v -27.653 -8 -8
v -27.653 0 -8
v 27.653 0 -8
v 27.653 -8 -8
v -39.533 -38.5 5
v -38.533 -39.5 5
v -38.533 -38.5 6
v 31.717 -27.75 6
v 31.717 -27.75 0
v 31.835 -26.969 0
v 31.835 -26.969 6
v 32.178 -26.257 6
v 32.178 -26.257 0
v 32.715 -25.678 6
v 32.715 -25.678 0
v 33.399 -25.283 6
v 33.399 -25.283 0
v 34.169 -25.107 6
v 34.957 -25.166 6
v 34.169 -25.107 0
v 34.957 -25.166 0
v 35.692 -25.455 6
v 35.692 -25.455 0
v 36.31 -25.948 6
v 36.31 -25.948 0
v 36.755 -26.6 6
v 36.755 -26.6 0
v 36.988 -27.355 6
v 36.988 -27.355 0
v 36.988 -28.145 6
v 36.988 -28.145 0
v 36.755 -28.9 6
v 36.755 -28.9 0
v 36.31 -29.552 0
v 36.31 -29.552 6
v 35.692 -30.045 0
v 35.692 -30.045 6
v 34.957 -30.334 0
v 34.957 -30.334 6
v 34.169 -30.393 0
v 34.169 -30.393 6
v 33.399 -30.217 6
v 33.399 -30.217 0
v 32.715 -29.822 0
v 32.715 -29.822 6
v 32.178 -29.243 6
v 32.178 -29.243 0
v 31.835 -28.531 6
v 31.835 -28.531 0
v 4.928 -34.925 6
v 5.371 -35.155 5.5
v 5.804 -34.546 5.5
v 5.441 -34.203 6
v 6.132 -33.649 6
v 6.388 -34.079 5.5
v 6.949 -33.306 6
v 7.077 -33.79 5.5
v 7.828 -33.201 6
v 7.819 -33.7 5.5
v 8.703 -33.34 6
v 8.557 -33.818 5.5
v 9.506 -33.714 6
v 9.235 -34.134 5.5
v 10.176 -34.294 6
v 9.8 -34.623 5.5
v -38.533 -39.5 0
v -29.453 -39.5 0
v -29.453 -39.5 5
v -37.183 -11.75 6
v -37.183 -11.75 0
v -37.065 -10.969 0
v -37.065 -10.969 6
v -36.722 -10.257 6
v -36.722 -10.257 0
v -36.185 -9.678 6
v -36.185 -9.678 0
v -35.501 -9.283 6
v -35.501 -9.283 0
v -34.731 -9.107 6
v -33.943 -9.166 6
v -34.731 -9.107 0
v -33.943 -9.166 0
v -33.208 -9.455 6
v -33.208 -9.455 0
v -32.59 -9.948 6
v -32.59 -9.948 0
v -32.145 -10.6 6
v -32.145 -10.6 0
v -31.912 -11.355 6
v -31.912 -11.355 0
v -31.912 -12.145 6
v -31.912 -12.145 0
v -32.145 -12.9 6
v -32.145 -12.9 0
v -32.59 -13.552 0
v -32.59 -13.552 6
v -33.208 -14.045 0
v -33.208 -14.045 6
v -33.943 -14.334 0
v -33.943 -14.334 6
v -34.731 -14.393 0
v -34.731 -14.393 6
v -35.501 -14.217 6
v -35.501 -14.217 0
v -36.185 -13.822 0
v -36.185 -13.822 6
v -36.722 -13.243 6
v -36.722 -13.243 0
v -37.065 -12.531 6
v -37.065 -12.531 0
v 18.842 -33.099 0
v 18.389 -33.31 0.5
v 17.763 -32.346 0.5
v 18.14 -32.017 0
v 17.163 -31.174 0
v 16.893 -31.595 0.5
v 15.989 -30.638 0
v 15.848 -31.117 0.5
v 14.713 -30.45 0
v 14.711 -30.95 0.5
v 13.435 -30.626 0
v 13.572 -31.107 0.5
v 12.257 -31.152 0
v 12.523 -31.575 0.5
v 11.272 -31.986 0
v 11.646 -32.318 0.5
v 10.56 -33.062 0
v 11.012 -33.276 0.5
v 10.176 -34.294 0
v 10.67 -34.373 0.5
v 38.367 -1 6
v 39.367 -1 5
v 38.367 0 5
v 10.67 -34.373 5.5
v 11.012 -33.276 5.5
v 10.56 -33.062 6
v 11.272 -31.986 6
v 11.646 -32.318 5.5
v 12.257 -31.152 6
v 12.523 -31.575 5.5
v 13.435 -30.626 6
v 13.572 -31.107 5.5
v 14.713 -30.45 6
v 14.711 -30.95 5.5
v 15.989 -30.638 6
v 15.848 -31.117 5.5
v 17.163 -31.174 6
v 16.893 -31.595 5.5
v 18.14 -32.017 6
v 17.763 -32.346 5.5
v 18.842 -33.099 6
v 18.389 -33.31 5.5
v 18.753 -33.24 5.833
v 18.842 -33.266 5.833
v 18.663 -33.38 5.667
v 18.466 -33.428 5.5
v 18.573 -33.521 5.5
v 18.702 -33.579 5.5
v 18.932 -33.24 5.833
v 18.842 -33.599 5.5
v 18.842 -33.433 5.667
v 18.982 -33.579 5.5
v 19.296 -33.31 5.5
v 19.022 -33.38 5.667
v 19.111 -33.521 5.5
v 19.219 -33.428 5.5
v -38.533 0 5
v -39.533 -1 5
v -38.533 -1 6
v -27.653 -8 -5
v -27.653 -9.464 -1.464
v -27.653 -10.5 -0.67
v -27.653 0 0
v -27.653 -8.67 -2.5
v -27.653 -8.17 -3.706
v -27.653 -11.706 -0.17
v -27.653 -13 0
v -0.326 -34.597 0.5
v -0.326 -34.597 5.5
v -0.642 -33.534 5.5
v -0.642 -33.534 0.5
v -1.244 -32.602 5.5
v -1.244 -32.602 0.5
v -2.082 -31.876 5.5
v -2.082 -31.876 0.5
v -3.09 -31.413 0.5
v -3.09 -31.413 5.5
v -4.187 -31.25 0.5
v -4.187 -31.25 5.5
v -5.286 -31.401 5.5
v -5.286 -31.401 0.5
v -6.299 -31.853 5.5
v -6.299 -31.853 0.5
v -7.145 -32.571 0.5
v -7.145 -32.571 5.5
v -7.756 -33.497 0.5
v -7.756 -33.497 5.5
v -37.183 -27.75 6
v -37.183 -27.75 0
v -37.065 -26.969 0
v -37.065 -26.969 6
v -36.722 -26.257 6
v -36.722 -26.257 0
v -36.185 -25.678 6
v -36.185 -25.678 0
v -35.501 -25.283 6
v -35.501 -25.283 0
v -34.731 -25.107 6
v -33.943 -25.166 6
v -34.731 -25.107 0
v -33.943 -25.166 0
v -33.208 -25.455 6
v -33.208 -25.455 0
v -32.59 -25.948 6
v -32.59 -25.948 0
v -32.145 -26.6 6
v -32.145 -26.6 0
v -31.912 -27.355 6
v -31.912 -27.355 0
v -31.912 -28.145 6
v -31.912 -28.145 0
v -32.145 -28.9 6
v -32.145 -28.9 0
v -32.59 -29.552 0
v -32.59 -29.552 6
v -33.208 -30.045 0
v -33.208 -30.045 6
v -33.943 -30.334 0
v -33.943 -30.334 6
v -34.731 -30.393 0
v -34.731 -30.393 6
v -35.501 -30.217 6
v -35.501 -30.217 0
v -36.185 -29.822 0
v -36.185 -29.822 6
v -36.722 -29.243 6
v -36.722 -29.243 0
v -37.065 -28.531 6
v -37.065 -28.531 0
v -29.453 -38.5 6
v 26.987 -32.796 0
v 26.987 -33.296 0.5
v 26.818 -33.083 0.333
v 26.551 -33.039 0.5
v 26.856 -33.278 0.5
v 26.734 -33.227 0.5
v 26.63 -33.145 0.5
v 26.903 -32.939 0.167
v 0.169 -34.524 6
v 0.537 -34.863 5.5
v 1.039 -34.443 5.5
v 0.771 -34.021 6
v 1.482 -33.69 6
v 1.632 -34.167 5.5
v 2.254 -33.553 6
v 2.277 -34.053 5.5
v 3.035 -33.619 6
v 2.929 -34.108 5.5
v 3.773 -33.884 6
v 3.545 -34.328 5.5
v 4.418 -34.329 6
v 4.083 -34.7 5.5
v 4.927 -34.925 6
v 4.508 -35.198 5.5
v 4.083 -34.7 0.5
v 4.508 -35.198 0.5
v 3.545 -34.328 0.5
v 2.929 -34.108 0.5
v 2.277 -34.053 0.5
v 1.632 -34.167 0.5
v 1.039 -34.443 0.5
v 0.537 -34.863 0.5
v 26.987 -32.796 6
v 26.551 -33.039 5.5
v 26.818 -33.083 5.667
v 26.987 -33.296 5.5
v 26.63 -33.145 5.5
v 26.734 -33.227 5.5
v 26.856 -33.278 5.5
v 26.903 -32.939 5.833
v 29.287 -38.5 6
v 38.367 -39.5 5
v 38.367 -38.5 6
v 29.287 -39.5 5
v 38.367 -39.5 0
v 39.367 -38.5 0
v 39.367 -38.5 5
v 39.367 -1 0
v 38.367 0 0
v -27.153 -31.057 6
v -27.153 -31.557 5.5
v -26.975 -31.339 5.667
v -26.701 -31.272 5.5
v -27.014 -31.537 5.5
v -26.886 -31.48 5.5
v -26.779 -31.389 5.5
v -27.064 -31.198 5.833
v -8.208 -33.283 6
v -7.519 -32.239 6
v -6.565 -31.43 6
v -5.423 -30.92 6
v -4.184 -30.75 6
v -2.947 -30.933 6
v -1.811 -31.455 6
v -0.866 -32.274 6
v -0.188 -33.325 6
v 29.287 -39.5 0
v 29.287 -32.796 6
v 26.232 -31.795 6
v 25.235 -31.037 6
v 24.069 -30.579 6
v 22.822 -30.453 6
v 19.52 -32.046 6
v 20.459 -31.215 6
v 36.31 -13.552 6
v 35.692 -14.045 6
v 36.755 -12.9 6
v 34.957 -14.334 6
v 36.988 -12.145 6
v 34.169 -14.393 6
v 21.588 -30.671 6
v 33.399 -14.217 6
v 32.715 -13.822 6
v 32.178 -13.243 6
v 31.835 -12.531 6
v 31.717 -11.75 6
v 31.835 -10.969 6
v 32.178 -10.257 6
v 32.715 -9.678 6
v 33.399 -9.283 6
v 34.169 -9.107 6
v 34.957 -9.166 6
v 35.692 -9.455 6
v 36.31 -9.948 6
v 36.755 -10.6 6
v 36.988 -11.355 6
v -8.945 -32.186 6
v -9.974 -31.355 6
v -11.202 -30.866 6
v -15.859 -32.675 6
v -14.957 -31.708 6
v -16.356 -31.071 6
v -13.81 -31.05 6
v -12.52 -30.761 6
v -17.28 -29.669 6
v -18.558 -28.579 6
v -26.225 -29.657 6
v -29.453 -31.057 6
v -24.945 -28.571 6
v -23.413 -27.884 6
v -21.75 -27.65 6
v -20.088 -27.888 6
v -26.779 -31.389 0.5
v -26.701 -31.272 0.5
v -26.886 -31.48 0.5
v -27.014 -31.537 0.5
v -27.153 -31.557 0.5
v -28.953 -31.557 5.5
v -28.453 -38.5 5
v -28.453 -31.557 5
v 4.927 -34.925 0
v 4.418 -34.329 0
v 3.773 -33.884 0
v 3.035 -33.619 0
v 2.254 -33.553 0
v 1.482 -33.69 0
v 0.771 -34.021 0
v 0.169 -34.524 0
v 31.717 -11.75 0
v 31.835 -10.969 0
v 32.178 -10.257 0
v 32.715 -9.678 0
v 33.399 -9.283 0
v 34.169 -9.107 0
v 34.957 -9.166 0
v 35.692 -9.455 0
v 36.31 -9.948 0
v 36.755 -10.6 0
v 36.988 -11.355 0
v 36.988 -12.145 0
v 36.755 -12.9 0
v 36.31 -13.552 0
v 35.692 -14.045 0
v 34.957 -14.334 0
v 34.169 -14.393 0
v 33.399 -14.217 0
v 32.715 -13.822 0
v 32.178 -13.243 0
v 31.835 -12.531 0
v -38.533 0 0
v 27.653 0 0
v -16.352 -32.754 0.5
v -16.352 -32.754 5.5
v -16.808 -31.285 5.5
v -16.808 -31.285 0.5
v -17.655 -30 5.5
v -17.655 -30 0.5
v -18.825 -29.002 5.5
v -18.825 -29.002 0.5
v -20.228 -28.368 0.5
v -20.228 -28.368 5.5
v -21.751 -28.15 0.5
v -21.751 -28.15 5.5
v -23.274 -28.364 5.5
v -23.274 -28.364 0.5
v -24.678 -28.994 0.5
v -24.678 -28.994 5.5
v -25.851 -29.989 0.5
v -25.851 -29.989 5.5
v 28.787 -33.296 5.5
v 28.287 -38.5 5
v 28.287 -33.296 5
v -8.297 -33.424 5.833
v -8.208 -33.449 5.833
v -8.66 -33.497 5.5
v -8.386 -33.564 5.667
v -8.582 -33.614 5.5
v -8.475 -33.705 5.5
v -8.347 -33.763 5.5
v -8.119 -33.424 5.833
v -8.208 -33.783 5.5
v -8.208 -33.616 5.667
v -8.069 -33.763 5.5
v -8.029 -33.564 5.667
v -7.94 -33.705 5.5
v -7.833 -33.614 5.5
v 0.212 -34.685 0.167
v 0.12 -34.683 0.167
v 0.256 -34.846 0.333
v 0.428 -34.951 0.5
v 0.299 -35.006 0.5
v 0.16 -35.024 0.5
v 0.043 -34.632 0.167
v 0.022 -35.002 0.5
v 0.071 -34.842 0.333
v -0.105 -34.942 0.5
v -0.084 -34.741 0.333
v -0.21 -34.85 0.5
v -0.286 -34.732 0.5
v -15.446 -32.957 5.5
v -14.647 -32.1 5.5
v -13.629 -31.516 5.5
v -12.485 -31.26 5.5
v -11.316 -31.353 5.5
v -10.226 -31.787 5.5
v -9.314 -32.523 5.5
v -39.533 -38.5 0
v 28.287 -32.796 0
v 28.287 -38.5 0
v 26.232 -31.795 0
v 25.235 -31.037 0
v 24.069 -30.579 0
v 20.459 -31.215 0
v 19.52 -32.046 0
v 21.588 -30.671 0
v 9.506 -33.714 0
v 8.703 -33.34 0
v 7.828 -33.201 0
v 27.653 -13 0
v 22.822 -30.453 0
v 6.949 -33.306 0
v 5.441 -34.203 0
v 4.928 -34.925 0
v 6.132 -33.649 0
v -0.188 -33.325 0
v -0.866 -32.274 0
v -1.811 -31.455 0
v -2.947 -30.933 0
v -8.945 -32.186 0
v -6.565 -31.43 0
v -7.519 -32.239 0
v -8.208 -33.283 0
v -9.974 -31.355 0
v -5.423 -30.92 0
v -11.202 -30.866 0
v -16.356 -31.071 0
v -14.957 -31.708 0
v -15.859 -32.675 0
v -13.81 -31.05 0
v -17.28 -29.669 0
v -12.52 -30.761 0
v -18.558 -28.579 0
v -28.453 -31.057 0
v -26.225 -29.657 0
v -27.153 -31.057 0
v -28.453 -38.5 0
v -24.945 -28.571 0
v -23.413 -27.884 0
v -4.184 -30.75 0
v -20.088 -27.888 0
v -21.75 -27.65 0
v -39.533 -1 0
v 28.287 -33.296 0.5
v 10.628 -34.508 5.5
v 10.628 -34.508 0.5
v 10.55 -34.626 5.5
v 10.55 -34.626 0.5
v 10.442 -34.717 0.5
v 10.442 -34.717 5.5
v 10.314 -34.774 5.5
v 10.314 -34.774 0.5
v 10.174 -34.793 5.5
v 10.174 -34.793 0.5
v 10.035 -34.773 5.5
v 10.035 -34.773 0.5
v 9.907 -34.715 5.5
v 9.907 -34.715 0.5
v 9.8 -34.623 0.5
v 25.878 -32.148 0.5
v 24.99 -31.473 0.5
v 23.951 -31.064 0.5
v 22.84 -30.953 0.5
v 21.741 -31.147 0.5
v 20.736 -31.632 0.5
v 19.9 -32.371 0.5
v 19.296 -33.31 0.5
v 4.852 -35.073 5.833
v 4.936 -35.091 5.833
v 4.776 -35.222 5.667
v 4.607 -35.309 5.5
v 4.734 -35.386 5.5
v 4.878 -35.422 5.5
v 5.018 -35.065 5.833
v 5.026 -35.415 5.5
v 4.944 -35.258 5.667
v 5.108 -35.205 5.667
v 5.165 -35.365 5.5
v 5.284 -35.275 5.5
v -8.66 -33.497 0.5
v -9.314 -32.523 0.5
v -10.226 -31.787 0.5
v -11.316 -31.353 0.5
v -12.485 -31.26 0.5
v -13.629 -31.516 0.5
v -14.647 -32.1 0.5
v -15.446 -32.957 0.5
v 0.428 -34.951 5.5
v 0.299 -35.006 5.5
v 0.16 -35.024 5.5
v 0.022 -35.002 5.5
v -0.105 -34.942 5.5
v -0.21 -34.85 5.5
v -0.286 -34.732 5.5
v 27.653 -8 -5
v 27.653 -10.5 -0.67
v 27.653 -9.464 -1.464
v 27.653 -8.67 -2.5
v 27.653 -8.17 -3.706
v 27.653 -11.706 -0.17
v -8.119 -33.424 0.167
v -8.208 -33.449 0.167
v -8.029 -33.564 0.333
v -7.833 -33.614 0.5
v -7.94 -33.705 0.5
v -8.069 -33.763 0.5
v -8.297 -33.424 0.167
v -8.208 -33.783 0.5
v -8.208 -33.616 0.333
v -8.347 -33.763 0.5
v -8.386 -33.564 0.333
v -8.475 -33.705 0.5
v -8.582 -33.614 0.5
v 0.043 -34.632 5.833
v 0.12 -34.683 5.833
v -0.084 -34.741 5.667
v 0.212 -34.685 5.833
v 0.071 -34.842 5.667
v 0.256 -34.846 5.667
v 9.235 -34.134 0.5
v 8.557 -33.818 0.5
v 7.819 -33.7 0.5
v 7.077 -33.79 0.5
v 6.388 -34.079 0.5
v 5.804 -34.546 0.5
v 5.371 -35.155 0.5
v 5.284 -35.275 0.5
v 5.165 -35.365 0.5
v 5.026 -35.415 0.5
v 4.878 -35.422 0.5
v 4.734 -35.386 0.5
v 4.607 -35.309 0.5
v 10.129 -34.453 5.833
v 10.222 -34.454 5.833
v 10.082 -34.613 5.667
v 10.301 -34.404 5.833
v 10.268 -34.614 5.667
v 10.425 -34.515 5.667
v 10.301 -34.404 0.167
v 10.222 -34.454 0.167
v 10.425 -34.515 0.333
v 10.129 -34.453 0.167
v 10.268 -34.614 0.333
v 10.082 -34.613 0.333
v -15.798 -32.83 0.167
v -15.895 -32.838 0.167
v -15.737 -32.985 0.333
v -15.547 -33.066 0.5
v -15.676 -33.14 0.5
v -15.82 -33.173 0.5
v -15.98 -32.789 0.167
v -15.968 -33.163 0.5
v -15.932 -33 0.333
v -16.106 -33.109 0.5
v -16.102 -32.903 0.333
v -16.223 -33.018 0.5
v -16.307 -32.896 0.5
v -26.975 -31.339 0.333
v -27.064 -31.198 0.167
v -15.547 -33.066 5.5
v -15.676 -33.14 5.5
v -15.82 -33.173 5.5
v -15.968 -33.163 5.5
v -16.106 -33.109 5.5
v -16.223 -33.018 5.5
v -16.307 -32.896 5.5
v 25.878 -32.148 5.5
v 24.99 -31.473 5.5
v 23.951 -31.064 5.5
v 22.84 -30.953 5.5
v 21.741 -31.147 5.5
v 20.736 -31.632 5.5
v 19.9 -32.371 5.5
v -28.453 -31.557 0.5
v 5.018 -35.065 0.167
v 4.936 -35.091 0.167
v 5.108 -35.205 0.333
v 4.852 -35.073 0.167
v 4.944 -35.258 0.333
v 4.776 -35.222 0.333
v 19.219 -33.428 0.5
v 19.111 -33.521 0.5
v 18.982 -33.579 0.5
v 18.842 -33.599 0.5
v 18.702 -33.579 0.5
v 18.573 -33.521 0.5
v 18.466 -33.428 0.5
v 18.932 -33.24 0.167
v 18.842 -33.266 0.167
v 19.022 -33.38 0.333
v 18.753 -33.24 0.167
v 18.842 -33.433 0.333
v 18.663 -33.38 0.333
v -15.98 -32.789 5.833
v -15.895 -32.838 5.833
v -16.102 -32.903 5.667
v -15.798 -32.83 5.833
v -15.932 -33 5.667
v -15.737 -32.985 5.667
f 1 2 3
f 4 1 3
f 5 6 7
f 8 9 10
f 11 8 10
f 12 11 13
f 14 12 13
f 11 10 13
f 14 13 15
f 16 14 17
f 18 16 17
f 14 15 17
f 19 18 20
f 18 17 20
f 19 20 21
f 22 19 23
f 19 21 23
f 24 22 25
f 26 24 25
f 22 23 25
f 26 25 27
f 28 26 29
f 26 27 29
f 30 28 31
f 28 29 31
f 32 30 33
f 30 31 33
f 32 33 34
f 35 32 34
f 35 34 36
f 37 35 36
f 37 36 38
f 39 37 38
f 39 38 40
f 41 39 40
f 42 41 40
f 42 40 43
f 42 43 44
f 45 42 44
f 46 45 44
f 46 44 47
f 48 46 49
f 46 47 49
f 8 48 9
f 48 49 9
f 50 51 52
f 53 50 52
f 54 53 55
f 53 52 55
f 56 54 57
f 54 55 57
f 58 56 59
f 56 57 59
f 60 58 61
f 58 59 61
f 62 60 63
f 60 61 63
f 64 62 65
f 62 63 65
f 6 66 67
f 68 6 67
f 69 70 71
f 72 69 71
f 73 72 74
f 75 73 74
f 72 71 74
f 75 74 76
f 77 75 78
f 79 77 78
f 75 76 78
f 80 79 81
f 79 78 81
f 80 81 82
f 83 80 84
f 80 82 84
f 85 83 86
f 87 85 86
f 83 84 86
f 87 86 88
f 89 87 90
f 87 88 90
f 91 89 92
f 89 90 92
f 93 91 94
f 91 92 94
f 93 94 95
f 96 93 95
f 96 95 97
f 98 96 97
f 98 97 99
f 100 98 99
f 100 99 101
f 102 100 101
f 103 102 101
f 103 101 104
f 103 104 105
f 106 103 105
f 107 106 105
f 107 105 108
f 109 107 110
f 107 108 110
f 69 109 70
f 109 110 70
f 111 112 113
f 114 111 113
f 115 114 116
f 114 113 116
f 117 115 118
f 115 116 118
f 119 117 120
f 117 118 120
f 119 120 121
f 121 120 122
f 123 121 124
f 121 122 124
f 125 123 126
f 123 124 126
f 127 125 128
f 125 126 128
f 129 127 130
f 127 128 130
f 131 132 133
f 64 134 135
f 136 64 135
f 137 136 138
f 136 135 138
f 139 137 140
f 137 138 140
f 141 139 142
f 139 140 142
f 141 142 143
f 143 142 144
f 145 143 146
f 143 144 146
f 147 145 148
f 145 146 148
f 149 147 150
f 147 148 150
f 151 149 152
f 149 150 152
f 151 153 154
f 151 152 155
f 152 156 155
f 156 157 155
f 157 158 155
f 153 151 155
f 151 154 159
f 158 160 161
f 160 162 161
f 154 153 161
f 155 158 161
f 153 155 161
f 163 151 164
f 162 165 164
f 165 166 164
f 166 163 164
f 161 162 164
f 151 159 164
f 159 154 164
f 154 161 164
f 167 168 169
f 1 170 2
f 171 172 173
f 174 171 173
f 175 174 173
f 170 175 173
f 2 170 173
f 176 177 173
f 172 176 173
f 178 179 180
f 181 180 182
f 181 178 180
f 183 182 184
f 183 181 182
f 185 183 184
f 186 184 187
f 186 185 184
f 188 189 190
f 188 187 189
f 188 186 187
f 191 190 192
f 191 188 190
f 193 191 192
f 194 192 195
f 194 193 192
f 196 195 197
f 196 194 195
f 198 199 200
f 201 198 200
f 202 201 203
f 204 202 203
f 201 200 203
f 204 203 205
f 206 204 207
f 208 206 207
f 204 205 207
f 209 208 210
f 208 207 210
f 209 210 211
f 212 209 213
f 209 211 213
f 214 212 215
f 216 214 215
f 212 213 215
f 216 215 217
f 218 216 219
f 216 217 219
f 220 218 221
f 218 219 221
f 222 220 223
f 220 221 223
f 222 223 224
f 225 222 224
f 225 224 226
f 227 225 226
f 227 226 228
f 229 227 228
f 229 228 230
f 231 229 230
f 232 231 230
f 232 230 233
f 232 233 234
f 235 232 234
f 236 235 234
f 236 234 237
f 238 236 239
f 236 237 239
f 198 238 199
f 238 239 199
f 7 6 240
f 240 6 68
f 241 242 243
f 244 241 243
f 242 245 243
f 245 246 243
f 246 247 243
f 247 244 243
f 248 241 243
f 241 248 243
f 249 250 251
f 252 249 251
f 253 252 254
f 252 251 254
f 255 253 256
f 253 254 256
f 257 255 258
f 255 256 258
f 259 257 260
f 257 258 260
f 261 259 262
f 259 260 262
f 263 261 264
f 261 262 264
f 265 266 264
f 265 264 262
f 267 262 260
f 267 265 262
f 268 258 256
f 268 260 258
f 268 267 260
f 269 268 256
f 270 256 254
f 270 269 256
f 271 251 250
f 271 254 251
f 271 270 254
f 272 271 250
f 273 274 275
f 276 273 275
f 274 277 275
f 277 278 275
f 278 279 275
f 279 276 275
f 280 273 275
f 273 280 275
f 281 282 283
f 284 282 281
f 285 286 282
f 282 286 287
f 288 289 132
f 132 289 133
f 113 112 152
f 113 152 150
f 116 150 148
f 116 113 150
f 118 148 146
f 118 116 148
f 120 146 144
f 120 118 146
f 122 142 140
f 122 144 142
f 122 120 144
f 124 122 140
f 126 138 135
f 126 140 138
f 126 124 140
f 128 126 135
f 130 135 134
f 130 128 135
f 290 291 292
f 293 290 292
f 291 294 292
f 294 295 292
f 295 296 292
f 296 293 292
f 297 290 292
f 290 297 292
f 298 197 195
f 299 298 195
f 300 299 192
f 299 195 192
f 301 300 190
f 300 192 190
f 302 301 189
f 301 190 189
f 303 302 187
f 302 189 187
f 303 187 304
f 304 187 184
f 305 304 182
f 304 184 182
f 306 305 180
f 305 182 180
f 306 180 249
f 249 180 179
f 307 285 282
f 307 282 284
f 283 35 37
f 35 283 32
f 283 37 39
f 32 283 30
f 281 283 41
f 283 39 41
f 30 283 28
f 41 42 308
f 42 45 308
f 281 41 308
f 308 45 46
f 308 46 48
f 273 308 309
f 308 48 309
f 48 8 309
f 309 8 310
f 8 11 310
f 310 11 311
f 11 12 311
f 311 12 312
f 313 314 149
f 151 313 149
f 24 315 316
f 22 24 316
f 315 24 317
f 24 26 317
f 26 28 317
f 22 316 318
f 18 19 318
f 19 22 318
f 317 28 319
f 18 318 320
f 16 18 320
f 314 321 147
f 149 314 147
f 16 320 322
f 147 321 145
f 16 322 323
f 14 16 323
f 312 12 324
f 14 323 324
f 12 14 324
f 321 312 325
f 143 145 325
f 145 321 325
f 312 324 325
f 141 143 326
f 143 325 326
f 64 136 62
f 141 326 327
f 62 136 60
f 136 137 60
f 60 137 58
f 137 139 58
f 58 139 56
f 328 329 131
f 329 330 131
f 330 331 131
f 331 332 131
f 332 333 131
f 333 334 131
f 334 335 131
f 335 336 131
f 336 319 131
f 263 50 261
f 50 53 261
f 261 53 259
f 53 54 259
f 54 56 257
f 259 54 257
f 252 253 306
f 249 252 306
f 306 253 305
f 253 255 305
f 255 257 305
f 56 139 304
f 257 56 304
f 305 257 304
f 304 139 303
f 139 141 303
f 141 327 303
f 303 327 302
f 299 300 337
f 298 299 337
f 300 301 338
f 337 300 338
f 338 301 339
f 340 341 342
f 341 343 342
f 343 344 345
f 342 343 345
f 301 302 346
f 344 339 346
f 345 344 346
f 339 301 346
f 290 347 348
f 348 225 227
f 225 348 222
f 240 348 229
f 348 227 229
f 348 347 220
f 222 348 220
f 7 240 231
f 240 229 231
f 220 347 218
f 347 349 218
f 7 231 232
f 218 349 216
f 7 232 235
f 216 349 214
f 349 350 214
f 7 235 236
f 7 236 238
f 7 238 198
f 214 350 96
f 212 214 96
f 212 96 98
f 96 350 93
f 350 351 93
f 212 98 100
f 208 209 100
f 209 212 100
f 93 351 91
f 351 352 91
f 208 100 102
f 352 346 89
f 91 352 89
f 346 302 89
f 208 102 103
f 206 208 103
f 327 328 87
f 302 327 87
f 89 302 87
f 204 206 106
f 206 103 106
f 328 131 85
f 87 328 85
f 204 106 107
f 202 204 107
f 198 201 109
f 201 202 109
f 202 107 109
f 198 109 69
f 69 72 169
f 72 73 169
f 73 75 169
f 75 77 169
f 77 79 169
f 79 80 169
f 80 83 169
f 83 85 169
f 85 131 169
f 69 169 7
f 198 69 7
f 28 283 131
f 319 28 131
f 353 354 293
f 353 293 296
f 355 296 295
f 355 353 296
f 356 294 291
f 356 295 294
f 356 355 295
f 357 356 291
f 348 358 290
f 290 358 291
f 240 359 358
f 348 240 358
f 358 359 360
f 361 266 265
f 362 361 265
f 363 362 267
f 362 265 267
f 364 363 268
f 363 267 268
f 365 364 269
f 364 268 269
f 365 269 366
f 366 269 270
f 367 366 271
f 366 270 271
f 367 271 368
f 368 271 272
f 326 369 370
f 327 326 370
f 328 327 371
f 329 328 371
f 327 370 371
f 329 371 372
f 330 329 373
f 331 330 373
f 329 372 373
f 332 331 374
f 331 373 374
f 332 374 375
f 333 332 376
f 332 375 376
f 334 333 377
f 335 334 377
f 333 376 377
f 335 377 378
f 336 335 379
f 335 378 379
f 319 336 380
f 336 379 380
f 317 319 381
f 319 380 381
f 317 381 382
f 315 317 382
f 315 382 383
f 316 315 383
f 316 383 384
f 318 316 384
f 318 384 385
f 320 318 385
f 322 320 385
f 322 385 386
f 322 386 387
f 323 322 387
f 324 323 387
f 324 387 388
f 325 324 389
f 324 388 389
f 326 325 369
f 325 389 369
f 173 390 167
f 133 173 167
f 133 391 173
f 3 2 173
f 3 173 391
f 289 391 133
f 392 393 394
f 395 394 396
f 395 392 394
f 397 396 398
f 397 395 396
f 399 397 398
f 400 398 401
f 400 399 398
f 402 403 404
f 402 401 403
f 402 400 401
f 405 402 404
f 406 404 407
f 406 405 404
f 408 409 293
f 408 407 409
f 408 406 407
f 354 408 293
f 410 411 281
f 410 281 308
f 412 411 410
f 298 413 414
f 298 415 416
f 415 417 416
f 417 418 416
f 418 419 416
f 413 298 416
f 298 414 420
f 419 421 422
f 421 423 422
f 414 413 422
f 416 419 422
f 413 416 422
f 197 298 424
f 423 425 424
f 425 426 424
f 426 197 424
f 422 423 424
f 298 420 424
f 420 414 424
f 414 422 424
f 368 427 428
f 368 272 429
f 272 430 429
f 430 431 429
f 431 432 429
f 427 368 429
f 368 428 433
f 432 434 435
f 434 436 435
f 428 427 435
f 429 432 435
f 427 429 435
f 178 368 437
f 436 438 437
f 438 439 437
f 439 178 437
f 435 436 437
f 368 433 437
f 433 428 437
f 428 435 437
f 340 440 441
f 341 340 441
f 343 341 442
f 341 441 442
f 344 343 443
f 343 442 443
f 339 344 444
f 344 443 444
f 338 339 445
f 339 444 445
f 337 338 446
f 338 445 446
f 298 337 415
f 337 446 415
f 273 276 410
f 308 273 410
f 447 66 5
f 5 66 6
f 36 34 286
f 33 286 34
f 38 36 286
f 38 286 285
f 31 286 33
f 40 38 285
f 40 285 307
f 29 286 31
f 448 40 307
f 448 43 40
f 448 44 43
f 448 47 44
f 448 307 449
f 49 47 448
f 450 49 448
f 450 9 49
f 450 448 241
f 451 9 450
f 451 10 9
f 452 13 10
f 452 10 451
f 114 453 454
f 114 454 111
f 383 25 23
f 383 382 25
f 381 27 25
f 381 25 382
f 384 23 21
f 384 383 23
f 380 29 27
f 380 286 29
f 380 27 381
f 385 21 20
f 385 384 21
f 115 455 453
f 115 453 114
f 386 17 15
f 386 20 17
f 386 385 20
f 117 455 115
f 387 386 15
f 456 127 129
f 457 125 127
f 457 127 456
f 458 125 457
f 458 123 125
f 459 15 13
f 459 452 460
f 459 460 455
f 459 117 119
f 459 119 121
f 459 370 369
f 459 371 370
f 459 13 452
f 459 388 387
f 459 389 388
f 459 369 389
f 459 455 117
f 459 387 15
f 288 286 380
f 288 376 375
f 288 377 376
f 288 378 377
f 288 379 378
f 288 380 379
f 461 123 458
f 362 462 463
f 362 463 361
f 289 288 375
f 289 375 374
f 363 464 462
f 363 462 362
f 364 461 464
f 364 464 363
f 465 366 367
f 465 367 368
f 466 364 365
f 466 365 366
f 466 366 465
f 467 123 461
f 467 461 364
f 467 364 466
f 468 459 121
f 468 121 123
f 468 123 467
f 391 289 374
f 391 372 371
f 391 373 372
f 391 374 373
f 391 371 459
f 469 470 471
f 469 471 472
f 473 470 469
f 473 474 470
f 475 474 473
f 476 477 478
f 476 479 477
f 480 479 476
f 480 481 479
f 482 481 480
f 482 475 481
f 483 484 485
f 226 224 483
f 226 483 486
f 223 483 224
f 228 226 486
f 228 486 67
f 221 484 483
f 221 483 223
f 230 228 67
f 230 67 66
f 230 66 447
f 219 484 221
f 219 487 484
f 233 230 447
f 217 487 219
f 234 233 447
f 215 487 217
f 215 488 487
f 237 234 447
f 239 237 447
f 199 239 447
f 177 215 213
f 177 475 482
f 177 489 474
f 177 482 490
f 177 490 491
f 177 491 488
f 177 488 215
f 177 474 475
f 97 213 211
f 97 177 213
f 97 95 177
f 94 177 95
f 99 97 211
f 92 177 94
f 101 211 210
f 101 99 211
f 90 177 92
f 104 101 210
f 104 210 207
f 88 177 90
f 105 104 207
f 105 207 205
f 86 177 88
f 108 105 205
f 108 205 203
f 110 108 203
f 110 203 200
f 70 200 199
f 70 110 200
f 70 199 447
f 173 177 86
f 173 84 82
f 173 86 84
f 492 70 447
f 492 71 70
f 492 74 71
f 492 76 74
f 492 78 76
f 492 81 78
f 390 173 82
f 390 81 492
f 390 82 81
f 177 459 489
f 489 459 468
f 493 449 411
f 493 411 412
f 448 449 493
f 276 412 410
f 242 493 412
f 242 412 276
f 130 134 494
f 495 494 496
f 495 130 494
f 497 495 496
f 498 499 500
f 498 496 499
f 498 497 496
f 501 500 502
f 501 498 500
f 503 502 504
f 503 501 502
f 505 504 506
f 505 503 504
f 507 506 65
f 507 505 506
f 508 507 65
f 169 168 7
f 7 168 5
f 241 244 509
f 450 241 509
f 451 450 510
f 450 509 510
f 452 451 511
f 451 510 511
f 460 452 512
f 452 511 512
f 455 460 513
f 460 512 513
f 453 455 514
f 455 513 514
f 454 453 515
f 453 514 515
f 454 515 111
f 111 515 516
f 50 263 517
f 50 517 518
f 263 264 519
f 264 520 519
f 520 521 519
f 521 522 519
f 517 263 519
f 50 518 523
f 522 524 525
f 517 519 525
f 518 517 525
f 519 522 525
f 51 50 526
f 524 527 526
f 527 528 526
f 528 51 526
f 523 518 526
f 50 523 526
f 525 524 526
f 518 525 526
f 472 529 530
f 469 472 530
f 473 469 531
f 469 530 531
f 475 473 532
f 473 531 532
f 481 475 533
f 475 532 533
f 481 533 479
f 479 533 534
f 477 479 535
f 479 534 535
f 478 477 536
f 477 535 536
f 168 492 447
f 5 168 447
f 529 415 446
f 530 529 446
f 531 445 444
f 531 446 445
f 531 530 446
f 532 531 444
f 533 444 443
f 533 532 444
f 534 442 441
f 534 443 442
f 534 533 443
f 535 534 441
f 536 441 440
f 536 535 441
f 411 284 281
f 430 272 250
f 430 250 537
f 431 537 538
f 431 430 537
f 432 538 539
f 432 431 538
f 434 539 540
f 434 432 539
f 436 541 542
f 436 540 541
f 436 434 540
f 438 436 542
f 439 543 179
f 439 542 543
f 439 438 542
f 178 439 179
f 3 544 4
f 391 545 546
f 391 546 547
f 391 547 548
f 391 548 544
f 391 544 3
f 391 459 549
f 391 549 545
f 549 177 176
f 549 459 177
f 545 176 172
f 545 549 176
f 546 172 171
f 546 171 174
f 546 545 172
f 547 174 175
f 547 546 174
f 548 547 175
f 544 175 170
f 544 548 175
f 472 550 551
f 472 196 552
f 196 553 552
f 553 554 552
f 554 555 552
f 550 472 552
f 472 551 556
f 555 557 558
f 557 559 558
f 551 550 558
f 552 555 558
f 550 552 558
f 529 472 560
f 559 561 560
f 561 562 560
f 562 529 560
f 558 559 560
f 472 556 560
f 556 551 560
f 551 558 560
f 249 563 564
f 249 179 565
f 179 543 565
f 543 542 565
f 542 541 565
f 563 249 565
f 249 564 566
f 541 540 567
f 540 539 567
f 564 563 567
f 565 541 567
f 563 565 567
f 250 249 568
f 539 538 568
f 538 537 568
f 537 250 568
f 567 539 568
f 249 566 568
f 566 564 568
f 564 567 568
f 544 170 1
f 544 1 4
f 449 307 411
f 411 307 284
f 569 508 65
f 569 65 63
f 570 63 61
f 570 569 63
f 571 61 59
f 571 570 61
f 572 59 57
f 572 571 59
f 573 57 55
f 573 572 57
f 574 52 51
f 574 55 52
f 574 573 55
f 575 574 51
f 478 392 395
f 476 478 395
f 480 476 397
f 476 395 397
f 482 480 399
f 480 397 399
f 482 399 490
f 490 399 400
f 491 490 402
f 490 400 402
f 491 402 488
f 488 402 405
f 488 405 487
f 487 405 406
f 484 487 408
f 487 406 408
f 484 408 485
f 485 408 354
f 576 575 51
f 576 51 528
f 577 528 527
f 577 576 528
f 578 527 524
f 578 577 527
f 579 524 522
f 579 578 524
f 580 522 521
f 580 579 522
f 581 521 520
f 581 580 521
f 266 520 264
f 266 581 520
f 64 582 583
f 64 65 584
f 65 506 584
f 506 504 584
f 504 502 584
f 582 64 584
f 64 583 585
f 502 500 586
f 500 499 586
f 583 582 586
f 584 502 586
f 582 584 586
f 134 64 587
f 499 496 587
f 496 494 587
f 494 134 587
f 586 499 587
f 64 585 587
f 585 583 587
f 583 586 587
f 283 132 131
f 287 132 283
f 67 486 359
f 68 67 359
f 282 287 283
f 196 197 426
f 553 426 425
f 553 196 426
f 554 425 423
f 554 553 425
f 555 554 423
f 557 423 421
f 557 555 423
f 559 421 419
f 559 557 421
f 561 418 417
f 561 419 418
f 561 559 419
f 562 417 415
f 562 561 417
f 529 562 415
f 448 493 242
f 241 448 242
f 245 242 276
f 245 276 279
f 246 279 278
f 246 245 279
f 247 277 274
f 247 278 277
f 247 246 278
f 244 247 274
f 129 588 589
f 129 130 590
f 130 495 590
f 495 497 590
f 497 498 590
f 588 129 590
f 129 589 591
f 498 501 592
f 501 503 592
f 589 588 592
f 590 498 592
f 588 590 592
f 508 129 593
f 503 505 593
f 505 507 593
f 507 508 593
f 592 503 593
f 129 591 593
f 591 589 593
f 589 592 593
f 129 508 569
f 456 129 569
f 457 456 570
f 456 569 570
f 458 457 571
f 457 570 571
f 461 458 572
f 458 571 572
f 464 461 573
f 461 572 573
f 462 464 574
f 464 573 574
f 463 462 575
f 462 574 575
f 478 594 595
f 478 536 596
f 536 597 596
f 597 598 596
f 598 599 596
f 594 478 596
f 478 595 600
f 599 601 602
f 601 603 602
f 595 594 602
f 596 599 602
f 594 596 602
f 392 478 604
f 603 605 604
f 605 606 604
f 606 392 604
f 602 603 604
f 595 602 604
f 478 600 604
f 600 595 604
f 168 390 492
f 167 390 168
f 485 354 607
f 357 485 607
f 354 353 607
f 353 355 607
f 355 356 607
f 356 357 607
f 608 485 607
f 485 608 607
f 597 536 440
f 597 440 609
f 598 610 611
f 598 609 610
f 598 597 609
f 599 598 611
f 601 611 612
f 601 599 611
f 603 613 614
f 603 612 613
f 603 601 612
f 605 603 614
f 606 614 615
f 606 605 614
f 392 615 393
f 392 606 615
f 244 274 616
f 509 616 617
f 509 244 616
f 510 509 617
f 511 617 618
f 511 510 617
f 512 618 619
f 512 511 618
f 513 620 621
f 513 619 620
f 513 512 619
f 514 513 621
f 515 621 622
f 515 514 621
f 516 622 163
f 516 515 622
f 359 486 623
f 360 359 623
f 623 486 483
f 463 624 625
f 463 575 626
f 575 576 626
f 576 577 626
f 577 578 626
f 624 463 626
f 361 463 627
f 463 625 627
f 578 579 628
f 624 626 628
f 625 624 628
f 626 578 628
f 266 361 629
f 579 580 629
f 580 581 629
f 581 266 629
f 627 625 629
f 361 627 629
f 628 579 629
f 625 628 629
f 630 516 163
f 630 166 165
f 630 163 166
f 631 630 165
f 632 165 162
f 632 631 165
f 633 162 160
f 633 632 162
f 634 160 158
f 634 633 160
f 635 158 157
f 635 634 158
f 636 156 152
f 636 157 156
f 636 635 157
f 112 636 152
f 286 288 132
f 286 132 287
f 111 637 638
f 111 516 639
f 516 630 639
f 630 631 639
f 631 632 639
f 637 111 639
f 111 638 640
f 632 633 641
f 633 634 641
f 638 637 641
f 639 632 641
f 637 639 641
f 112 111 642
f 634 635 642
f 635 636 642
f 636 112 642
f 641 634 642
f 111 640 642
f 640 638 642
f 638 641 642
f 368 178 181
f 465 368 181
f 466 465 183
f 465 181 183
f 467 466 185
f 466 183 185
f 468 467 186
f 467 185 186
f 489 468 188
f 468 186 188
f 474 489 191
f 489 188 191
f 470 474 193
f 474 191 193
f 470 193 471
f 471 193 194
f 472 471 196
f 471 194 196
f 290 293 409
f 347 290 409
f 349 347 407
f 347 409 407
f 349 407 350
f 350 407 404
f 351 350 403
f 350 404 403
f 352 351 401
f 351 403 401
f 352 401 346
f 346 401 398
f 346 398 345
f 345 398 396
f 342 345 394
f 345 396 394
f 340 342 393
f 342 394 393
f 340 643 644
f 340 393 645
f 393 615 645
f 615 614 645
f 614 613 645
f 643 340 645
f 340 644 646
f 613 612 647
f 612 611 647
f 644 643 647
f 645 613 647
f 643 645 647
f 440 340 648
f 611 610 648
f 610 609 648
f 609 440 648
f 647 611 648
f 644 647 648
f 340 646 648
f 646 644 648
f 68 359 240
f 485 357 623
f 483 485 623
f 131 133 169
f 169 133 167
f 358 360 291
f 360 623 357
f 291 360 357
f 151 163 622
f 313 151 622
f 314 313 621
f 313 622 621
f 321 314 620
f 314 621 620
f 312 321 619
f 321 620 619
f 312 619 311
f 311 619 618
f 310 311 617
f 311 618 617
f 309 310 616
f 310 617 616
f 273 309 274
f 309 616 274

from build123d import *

# Parameters (mm, degrees)
SKETCH3_W           = 78.9
SKETCH3_H           = 32
BOSS_EXTRUDE1_DEPTH = 10
SKETCH3_4_R         = 2.375
CUT_EXTRUDE1_DEPTH  = 8
SKETCH4_W           = 55.14
SKETCH4_H           = 39
BOSS_EXTRUDE2_DEPTH = 6
CUT_EXTRUDE2_REACH  = 66.041
SKETCH9_W           = 78.9
SKETCH9_H           = 10
CUT_EXTRUDE4_DEPTH  = 62.929181295
BOSS_EXTRUDE4_START = -6
SKETCH10_R          = 2.65
BOSS_EXTRUDE4_DEPTH = 6
SKETCH11_W          = 55.305509596
SKETCH11_H          = 8
BOSS_EXTRUDE5_DEPTH = 8
FILLET2_R           = 5
CHAMFER3_SIZE       = 1
CHAMFER4_SIZE       = 0.5


with BuildPart() as part:
    # Sketch3 → Boss-Extrude1 (new body)
    with BuildSketch(Plane(origin=(0, 0, 0), x_dir=(1, 0, 0), z_dir=(0, 1, 0))):
        with Locations((0, 16)):
            Rectangle(SKETCH3_W, SKETCH3_H)
    extrude(amount=BOSS_EXTRUDE1_DEPTH)

    # Sketch3<4> → Cut-Extrude1 (cut)
    with BuildSketch(Plane(origin=(0, 0, 0), x_dir=(1, 0, 0), z_dir=(0, 1, 0))):
        with Locations(Location((-34.45, 9.5, 0), (0, 0, 270))):
            Circle(SKETCH3_4_R)
        with Locations(Location((34.45, 9.5, 0), (0, 0, 270))):
            Circle(SKETCH3_4_R)
        with Locations(Location((-34.45, 25.5, 0), (0, 0, 270))):
            Circle(SKETCH3_4_R)
        with Locations(Location((34.45, 25.5, 0), (0, 0, 270))):
            Circle(SKETCH3_4_R)
    extrude(amount=CUT_EXTRUDE1_DEPTH, mode=Mode.SUBTRACT)

    # Sketch4 → Boss-Extrude2 (add)
    with BuildSketch(Plane.XY):
        with Locations((-0.082754798, -19.5)):
            Rectangle(SKETCH4_W, SKETCH4_H)
    extrude(amount=-BOSS_EXTRUDE2_DEPTH)

    # Sketch6 → Cut-Extrude2 (cut, up to next)
    with BuildSketch(Plane.XY, mode=Mode.PRIVATE) as cut_extrude2_sk1:
        with BuildLine():
            Line((-27.652754798, -39), (27.487245202, -39))
            Line((27.487245202, -39), (27.487245202, -32.795515755))
            ThreePointArc((27.487245202, -32.795515755), (27.113130048, -33.279409344), (26.55063318, -33.039175235))
            ThreePointArc((26.55063318, -33.039175235), (22.840340095, -30.952832292), (19.295797115, -33.309804228))
            ThreePointArc((19.295797115, -33.309804228), (18.842245202, -33.599350759), (18.388693289, -33.309804228))
            ThreePointArc((18.388693289, -33.309804228), (14.135992665, -30.988143783), (10.669672877, -34.373435048))
            ThreePointArc((10.669672877, -34.373435048), (10.313792265, -34.774157145), (9.799721264, -34.622630861))
            ThreePointArc((9.799721264, -34.622630861), (7.44477434, -33.719326103), (5.371236745, -35.155354078))
            ThreePointArc((5.371236745, -35.155354078), (4.951993147, -35.42426536), (4.508475892, -35.197613829))
            ThreePointArc((4.508475892, -35.197613829), (2.60438519, -34.058927341), (0.536516234, -34.862722278))
            ThreePointArc((0.536516234, -34.862722278), (0.021886532, -35.001511273), (-0.325508515, -34.597255418))
            ThreePointArc((-0.325508515, -34.597255418), (-3.632594875, -31.292369955), (-7.755777397, -33.496560058))
            ThreePointArc((-7.755777397, -33.496560058), (-8.207754798, -33.782746053), (-8.659732199, -33.496560058))
            ThreePointArc((-8.659732199, -33.496560058), (-11.896894258, -31.262329464), (-15.446236111, -32.95737429))
            ThreePointArc((-15.446236111, -32.95737429), (-15.968076529, -33.16278259), (-16.352419433, -32.754382635))
            ThreePointArc((-16.352419433, -32.754382635), (-20.981382663, -28.205325535), (-26.701290363, -31.271899679))
            ThreePointArc((-26.701290363, -31.271899679), (-27.262908741, -31.544719865), (-27.652754798, -31.057004673))
            Line((-27.652754798, -31.057004673), (-27.652754798, -39))
        make_face()
    cut_extrude2_tool1 = extrude(cut_extrude2_sk1.sketch, amount=-CUT_EXTRUDE2_REACH, mode=Mode.PRIVATE) & part.part
    add(cut_extrude2_tool1.solids().sort_by_distance((-1.936265, -35.219125, 0))[0], mode=Mode.SUBTRACT)

    # Sketch9 → Cut-Extrude4 (cut, through all)
    with BuildSketch(Plane.XY):
        with Locations((0, 5)):
            Rectangle(SKETCH9_W, SKETCH9_H)
    extrude(amount=-CUT_EXTRUDE4_DEPTH, mode=Mode.SUBTRACT)

    # Sketch10 → Boss-Extrude4 (add)
    # profile 1 of 2: a face of its own
    with BuildSketch(Plane(origin=(0, 0, -6), x_dir=(-1, 0, 0), z_dir=(0, 0, -1)).offset(BOSS_EXTRUDE4_START)):
        with BuildLine():
            Line((-27.487245202, 0), (-39.367245202, 0))
            Line((-39.367245202, 0), (-39.367245202, -39.5))
            Line((-39.367245202, -39.5), (-28.287245202, -39.5))
            Line((-28.287245202, -39.5), (-28.287245202, -33.295515755))
            Line((-28.287245202, -33.295515755), (-26.987245202, -33.295515755))
            ThreePointArc((-26.987245202, -33.295515755), (-27.340798593, -33.149069145), (-27.487245202, -32.795515755))
            Line((-27.487245202, -32.795515755), (-27.487245202, 0))
        make_face()
        with Locations((-34.367245202, -11.75)):
            Circle(SKETCH10_R, mode=Mode.SUBTRACT)
        with Locations((-34.367245202, -27.75)):
            Circle(SKETCH10_R, mode=Mode.SUBTRACT)
    # profile 2 of 2: a face of its own
    with BuildSketch(Plane(origin=(0, 0, -6), x_dir=(-1, 0, 0), z_dir=(0, 0, -1)).offset(BOSS_EXTRUDE4_START)):
        with BuildLine():
            Line((27.652754798, 0), (39.532754798, 0))
            Line((39.532754798, 0), (39.532754798, -39.5))
            Line((39.532754798, -39.5), (28.452754798, -39.5))
            Line((28.452754798, -39.5), (28.452754798, -31.557004673))
            Line((28.452754798, -31.557004673), (27.152754798, -31.557004673))
            ThreePointArc((27.152754798, -31.557004673), (27.506308189, -31.410558063), (27.652754798, -31.057004673))
            Line((27.652754798, -31.057004673), (27.652754798, 0))
        make_face()
        with Locations((34.532754798, -11.75)):
            Circle(SKETCH10_R, mode=Mode.SUBTRACT)
        with Locations((34.532754798, -27.75)):
            Circle(SKETCH10_R, mode=Mode.SUBTRACT)
    extrude(amount=BOSS_EXTRUDE4_DEPTH)

    # Sketch11 → Boss-Extrude5 (add)
    with BuildSketch(Plane.XY):
        with Locations((0, -4)):
            Rectangle(SKETCH11_W, SKETCH11_H)
    extrude(amount=BOSS_EXTRUDE5_DEPTH)

    # Fillet2
    fillet2_edges = [part.edges().sort_by_distance(p)[0] for p in [
        (0, -8, 0),
    ]]
    fillet(fillet2_edges, radius=FILLET2_R)

    # Chamfer3
    chamfer3_edges = [part.edges().sort_by_distance(p)[0] for p in [
        (28.287245202, -39.5, -3),
        (39.367245202, -39.5, -3),
        (39.367245202, 0, -3),
        (39.367245202, -19.75, -6),
        (33.827245202, -39.5, -6),
        (28.287245202, -36.397757877, -6),
        (-39.532754798, 0, -3),
        (-39.532754798, -39.5, -3),
        (-28.452754798, -39.5, -3),
        (-28.452754798, -35.528502336, -6),
        (-33.992754798, -39.5, -6),
        (-39.532754798, -19.75, -6),
        (-0.082754798, 0, -6),
    ]]
    chamfer(chamfer3_edges, length=CHAMFER3_SIZE)

    # Chamfer4
    chamfer4_edges = [part.edges().sort_by_distance(p)[0] for p in [
        (26.734094792, -33.226694221, 0),
        (26.734094792, -33.226694221, -6),
        (27.637245202, -33.295515755, 0),
        (28.137245202, -33.295515755, -6),
        (-27.802754798, -31.557004673, 0),
        (-28.302754798, -31.557004673, -6),
        (-15.968076529, -33.16278259, -6),
        (-11.896894258, -31.262329464, -6),
        (-8.207754798, -33.782746053, -6),
        (-3.632594875, -31.292369955, -6),
        (0.021886532, -35.001511273, -6),
        (2.60438519, -34.058927341, -6),
        (4.951993147, -35.42426536, -6),
        (7.44477434, -33.719326103, -6),
        (10.313792265, -34.774157145, -6),
        (14.135992665, -30.988143783, -6),
        (18.842245202, -33.599350759, -6),
        (22.840340095, -30.952832292, -6),
        (-26.885778679, -31.479761993, -6),
        (-20.981382663, -28.205325535, -6),
        (-15.968076529, -33.16278259, 0),
        (-20.981382663, -28.205325535, 0),
        (-26.885778679, -31.479761993, 0),
        (22.840340095, -30.952832292, 0),
        (18.842245202, -33.599350759, 0),
        (14.135992665, -30.988143783, 0),
        (10.313792265, -34.774157145, 0),
        (7.44477434, -33.719326103, 0),
        (4.951993147, -35.42426536, 0),
        (2.60438519, -34.058927341, 0),
        (0.021886532, -35.001511273, 0),
        (-3.632594875, -31.292369955, 0),
        (-8.207754798, -33.782746053, 0),
        (-11.896894258, -31.262329464, 0),
    ]]
    chamfer(chamfer4_edges, length=CHAMFER4_SIZE - 0.0001)  # a hair under: the kernel refuses the full size


with BuildPart() as body_2:
    # Mirror1: mirrored copy
    add(part.part.mirror(Plane(origin=(39.45, 10, 0), x_dir=(1, 0, 0), z_dir=(0, 0, 1))))


solid = body_2.part
